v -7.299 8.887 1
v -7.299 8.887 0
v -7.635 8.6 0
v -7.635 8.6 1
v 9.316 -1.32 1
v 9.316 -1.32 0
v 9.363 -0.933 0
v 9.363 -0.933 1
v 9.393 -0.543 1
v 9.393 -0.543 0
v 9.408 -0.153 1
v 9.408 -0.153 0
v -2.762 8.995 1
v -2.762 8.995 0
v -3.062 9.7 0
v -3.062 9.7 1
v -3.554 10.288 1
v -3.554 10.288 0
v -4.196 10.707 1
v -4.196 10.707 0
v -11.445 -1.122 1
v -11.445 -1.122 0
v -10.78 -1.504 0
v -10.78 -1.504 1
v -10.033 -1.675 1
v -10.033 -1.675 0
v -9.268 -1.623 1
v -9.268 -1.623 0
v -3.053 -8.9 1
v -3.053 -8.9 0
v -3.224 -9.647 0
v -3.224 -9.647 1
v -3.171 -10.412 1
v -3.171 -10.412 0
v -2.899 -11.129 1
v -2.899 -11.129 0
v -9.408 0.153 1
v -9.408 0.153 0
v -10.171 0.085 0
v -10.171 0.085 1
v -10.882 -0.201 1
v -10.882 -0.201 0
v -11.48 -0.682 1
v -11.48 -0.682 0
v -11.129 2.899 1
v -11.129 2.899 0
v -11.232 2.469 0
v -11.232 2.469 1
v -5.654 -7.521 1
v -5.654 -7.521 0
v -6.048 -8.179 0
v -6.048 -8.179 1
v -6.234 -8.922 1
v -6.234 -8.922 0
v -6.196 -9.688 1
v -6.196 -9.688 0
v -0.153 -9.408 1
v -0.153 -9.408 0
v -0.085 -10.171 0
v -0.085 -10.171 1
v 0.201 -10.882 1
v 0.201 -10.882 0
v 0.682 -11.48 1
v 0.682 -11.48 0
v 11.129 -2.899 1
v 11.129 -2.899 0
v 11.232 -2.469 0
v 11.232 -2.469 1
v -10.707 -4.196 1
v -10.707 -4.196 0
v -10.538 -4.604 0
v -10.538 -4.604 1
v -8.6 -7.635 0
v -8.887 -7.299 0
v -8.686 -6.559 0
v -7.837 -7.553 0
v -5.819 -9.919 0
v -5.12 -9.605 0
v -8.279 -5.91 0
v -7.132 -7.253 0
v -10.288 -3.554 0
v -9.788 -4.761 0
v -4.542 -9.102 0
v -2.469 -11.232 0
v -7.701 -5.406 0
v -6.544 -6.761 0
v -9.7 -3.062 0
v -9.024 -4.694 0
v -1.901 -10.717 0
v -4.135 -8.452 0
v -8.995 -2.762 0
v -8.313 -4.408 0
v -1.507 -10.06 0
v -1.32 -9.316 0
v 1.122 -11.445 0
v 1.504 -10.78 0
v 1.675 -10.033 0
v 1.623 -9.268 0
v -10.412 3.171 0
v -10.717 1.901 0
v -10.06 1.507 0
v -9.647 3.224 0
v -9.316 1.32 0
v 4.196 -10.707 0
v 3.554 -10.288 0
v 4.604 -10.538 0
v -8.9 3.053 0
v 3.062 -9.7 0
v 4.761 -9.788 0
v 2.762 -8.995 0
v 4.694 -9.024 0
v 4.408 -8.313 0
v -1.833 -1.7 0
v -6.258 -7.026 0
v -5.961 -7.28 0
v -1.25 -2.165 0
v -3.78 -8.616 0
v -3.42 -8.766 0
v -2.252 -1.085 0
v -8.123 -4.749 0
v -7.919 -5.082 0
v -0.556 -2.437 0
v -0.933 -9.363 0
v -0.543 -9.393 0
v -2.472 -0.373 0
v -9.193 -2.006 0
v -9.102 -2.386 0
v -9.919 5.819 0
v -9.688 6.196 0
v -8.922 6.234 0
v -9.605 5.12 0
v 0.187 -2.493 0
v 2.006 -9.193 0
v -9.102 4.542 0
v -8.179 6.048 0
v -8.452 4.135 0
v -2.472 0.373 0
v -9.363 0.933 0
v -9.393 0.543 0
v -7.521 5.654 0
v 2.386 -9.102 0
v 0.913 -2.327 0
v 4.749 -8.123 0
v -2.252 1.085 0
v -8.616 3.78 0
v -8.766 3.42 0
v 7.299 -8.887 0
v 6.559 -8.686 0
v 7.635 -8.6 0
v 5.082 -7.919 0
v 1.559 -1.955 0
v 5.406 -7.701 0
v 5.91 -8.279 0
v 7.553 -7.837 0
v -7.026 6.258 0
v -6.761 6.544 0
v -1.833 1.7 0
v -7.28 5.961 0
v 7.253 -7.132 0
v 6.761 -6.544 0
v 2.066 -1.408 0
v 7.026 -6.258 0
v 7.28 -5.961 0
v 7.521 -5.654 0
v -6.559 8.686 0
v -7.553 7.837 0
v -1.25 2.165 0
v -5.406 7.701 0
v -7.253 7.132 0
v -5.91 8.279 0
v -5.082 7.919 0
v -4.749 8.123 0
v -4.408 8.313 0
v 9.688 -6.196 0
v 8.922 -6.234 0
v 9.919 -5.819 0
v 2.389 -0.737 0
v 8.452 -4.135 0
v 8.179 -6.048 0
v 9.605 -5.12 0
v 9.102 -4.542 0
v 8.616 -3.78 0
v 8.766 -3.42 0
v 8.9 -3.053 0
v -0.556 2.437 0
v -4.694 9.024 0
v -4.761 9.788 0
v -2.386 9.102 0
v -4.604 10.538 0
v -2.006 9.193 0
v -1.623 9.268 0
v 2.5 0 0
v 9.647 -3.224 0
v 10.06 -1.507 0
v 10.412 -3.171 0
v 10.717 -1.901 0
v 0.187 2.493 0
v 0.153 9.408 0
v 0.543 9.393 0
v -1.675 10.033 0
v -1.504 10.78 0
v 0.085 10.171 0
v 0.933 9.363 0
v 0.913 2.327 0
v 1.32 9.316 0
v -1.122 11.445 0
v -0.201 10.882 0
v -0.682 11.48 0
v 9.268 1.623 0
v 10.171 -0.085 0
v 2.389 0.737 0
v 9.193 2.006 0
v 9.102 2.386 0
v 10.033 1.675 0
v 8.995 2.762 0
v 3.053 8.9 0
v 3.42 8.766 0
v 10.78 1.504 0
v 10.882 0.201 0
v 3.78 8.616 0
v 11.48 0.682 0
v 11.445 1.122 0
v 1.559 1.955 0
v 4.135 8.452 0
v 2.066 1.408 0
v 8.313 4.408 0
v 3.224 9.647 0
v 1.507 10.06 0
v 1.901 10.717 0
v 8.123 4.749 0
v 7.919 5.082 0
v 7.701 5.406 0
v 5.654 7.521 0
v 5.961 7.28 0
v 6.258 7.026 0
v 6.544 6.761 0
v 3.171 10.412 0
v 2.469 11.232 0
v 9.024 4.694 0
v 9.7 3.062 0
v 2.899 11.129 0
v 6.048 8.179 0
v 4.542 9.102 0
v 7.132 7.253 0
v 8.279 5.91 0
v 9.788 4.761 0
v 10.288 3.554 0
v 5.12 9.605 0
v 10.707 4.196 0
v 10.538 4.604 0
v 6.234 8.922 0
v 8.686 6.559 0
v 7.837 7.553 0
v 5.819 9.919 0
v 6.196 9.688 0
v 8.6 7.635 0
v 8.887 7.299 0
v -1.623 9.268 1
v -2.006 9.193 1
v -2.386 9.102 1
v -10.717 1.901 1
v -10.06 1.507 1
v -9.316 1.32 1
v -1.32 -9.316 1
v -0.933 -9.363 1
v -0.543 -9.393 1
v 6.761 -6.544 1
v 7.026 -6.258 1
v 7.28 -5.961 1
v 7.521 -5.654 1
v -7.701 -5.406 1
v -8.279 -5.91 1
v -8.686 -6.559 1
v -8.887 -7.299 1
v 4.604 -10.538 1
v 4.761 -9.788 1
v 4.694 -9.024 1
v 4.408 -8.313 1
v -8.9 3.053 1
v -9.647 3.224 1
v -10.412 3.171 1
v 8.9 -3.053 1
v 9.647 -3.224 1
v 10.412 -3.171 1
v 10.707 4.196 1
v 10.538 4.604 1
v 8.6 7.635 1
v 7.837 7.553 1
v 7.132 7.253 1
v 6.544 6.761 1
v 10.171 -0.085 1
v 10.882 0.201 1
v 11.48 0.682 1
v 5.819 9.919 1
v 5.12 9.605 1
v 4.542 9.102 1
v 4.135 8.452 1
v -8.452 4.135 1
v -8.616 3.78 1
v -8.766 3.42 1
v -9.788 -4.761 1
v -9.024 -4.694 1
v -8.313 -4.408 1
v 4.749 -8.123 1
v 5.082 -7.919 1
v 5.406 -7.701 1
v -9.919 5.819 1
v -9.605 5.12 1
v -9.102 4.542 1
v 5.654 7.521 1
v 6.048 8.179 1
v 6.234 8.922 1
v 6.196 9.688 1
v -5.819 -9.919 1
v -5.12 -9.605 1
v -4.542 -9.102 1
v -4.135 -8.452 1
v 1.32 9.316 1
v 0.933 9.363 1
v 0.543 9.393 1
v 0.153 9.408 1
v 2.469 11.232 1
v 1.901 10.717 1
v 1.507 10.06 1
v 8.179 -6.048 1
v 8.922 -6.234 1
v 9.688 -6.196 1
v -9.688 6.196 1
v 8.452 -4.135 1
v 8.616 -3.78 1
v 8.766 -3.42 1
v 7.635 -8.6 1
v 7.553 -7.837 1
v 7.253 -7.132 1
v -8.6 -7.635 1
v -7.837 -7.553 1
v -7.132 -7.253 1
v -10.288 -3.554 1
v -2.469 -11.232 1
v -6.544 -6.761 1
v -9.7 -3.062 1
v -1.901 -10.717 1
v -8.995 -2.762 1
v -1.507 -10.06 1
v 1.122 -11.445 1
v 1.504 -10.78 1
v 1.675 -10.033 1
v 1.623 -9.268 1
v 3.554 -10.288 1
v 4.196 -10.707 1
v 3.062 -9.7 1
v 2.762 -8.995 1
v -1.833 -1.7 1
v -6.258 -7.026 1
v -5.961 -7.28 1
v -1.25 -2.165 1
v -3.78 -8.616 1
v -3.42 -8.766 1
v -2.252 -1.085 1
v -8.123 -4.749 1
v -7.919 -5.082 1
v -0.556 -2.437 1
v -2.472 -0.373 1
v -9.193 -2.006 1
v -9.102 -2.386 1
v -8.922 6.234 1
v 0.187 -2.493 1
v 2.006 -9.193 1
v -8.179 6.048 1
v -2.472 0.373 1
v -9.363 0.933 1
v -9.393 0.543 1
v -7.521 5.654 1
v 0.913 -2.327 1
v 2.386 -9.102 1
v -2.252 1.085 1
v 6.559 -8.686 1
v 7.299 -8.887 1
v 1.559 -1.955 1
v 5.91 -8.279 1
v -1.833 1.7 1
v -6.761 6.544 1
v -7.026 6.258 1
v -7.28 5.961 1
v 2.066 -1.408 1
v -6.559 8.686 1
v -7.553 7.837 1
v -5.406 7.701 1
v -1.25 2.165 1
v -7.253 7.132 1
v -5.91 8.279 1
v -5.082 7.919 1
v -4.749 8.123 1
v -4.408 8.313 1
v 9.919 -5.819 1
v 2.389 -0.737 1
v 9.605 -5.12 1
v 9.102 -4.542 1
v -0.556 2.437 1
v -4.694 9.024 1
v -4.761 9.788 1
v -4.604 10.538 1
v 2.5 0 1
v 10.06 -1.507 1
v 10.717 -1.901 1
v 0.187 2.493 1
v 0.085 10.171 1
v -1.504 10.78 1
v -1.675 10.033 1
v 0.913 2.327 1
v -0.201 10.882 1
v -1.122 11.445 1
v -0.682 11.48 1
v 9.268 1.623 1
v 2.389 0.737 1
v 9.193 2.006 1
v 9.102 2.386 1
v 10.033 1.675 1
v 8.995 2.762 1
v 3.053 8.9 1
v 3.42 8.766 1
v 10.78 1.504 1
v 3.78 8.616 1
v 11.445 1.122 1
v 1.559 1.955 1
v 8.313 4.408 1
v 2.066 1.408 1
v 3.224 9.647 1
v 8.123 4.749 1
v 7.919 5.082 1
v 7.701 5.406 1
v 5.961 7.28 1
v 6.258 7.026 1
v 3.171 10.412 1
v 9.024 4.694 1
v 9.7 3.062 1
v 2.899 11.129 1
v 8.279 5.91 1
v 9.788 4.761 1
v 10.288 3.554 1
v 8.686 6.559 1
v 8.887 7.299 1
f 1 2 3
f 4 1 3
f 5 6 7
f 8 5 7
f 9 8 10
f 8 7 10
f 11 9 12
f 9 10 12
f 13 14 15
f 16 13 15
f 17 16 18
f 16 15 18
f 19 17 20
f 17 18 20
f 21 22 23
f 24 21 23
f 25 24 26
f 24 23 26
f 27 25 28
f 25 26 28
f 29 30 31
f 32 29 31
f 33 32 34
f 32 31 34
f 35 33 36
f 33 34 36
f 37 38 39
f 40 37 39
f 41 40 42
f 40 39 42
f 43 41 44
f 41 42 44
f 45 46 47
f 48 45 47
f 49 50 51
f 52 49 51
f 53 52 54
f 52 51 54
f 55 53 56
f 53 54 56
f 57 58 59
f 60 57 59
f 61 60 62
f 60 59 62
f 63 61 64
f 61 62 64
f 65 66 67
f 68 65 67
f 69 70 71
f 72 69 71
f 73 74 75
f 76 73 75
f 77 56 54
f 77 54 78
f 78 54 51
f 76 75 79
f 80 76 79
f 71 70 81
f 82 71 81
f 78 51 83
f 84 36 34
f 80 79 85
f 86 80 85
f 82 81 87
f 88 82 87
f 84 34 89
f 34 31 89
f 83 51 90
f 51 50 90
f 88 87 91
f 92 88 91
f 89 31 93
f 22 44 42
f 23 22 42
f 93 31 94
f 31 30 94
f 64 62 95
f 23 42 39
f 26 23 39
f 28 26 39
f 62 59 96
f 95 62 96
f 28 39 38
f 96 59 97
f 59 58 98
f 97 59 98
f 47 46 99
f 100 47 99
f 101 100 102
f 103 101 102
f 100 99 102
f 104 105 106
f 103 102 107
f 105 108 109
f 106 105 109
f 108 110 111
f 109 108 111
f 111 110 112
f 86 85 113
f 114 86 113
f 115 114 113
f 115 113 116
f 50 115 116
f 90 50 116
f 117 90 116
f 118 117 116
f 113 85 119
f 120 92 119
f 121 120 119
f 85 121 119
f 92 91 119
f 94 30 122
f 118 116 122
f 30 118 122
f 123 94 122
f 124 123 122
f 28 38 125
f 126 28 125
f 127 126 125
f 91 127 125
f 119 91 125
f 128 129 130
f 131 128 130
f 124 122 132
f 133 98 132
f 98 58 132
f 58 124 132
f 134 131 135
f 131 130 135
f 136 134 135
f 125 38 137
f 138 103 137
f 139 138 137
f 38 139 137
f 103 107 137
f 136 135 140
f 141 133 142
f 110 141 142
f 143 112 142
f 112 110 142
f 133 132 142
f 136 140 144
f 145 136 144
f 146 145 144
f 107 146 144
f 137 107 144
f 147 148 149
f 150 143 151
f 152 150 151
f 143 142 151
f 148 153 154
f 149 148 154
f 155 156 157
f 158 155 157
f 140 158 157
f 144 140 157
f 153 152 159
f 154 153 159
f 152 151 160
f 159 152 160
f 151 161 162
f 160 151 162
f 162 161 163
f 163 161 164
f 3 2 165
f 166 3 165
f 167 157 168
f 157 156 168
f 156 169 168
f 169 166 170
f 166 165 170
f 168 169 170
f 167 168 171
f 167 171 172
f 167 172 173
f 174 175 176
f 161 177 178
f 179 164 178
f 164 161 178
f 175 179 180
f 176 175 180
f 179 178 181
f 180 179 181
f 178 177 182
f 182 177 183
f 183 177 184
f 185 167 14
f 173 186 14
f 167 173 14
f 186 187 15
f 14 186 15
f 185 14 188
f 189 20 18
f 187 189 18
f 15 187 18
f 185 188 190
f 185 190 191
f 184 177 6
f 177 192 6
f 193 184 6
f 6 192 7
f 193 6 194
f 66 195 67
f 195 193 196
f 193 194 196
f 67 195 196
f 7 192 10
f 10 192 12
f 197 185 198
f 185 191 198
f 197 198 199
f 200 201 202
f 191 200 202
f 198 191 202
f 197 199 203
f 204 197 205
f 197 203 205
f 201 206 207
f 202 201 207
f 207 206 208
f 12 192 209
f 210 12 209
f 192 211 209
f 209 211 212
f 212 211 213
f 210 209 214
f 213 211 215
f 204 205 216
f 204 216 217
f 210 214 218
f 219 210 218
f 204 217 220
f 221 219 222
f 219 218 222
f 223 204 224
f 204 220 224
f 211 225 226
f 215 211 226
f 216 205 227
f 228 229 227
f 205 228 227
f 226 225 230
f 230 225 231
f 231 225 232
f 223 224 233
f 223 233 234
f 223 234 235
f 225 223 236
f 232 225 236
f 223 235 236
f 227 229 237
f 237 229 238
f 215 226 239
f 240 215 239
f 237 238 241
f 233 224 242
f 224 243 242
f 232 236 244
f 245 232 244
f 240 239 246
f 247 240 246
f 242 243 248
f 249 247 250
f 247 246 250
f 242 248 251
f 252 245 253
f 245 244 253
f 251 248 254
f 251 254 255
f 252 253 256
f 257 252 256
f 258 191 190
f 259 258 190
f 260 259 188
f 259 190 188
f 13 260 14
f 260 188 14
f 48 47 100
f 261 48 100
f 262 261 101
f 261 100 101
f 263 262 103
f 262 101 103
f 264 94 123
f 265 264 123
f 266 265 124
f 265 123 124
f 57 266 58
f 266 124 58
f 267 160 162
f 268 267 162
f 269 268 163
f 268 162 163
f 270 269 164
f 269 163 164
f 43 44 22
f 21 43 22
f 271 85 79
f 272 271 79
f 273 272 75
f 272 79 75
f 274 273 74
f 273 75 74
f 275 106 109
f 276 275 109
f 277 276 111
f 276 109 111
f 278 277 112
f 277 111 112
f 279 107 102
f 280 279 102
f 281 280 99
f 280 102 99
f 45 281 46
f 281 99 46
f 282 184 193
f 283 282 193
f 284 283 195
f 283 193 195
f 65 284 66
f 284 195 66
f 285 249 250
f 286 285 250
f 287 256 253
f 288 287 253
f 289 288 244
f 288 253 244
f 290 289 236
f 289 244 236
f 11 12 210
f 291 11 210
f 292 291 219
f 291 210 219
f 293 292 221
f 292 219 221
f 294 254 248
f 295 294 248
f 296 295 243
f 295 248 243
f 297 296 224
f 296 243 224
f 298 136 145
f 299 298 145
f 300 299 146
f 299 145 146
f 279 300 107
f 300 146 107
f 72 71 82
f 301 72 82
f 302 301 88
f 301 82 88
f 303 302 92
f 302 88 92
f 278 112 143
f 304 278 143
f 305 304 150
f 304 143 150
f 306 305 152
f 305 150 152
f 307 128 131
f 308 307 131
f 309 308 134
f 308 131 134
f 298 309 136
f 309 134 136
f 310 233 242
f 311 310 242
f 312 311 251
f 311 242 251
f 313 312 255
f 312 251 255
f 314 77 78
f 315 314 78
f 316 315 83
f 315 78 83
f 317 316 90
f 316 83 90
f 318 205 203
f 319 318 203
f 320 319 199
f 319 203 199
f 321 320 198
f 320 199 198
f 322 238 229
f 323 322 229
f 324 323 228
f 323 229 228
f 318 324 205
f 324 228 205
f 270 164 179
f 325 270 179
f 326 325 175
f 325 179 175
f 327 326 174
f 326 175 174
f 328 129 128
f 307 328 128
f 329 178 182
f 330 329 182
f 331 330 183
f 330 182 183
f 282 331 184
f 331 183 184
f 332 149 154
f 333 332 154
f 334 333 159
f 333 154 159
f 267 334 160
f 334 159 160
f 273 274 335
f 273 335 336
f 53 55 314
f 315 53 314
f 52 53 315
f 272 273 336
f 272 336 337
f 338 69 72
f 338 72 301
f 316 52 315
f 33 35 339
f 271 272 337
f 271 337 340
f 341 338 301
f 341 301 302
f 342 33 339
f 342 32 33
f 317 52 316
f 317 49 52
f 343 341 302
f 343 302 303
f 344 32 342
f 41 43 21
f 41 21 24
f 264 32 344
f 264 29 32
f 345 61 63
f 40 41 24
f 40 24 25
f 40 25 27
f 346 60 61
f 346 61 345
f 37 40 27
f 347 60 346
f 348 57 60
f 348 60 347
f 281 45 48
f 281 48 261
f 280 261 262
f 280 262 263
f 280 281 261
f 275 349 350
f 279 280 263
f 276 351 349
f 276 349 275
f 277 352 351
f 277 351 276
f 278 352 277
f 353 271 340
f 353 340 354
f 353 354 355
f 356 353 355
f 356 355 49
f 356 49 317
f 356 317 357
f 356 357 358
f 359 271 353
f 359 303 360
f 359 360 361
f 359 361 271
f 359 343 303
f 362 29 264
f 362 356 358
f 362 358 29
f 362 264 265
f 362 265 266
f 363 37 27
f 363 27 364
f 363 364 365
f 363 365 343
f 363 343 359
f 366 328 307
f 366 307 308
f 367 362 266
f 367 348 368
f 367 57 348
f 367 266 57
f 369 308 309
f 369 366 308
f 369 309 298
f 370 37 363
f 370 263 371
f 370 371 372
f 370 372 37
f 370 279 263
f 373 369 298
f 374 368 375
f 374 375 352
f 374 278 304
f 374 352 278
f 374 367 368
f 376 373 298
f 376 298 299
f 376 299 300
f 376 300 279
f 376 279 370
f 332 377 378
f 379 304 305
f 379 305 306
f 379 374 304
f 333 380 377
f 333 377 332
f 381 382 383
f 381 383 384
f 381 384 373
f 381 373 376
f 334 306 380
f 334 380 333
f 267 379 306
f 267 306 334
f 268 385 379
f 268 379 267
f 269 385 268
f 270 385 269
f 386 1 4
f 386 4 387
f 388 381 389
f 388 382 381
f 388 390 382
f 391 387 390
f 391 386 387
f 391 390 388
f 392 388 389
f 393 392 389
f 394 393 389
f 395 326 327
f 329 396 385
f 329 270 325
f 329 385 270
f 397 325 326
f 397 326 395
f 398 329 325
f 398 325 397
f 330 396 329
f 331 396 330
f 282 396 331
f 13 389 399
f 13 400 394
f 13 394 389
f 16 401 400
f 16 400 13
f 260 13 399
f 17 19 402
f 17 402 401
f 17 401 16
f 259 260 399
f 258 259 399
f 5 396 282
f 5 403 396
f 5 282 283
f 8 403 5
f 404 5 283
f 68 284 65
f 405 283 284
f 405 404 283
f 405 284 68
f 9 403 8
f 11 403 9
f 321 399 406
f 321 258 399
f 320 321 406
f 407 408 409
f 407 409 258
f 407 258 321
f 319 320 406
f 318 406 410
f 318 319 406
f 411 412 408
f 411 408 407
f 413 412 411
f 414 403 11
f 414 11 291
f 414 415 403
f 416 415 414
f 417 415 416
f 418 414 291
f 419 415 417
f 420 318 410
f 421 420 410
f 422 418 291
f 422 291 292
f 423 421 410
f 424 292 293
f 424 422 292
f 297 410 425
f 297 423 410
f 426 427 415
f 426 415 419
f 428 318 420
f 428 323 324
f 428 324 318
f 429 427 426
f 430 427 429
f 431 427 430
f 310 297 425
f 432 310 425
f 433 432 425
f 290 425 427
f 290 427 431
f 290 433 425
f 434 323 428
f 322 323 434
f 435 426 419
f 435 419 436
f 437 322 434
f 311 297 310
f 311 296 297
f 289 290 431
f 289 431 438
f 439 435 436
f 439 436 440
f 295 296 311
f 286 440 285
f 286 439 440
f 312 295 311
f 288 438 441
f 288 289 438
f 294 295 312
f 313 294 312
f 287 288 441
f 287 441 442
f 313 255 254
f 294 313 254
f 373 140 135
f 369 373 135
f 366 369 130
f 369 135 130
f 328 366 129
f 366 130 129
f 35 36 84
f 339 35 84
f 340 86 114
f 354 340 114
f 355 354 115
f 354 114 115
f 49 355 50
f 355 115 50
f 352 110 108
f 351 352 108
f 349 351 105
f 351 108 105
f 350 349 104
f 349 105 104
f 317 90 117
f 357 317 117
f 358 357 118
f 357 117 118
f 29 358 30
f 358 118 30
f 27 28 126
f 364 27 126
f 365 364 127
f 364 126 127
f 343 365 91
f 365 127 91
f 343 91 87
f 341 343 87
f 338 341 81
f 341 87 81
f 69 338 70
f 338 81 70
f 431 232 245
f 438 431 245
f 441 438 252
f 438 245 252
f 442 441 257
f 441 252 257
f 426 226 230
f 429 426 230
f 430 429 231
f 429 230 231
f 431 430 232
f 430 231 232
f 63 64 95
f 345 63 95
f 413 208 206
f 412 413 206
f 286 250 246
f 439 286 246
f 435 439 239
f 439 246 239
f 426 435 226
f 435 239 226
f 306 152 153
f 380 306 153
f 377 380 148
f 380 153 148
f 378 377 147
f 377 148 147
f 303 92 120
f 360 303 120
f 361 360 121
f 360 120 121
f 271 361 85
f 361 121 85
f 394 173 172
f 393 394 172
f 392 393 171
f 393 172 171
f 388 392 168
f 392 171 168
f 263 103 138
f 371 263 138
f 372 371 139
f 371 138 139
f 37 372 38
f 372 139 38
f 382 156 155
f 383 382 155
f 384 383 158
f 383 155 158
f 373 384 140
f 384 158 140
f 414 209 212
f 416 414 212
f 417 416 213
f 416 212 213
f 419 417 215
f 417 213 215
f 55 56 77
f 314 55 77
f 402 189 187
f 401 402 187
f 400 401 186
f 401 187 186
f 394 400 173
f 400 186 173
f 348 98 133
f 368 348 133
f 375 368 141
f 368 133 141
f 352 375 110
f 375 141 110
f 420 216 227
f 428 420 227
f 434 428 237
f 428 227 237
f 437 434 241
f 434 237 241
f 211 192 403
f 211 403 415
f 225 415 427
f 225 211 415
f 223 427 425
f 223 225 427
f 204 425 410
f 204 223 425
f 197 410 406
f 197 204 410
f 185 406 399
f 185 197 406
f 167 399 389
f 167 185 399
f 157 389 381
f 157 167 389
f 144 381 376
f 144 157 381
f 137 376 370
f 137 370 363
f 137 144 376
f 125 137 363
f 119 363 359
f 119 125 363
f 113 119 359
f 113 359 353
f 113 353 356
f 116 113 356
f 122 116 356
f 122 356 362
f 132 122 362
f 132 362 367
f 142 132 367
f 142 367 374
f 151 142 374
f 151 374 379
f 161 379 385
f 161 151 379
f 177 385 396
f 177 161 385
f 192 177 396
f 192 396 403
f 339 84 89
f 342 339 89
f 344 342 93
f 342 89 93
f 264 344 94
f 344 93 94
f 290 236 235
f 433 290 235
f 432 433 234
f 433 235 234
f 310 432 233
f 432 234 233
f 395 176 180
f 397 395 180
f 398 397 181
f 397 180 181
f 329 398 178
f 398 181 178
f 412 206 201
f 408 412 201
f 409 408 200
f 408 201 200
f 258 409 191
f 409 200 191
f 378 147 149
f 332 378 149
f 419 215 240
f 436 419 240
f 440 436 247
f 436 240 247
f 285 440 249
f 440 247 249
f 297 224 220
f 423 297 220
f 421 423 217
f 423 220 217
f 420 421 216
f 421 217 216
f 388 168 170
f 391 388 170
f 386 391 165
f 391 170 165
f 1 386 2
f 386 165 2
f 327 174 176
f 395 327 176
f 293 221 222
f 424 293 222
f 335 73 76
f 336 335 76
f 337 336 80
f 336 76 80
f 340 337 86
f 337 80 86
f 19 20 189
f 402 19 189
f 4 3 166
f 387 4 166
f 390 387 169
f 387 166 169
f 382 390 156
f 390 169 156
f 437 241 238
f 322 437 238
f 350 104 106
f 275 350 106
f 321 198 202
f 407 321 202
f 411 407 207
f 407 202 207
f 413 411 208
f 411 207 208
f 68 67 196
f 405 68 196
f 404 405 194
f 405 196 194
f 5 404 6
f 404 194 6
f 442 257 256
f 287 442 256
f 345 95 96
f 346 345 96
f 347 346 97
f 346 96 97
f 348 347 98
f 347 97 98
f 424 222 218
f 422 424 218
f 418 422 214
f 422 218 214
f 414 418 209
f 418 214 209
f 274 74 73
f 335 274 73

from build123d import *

# Parameters (mm, degrees)
F1_R     = 2.5
F2_DEPTH = 1


with BuildPart() as f2:
    # F1 (on Top) → F2 (new body)
    with BuildSketch(Plane.XY):
        with BuildLine():
            ThreePointArc((-1.6229776334, 9.2680599554), (-0.7382287643, 9.3800858219), (0.1531520845, 9.4078443957))
            ThreePointArc((0.1531520845, 9.4078443957), (-0.0317997207, 10.5374998224), (-0.6817601701, 11.4797736507))
            Line((-0.6817601701, 11.4797736507), (-1.1224656787, 11.4450893749))
            ThreePointArc((-1.1224656787, 11.4450893749), (-1.6170199342, 10.4127402859), (-1.6229776334, 9.2680599554))
        make_face()
        with BuildLine():
            ThreePointArc((9.4078443957, -0.1531520845), (9.4087792756, -0.0765785786), (9.4090909091, 0))
            ThreePointArc((9.4090909091, 0), (9.3737668631, 0.8145468262), (9.2680599554, 1.6229776334))
            ThreePointArc((9.2680599554, 1.6229776334), (9.1491169783, 2.1965086508), (8.9947183137, 2.7615275108))
            ThreePointArc((8.9947183137, 2.7615275108), (8.6928665104, 3.6007032045), (8.3129211438, 4.4075314852))
            ThreePointArc((8.3129211438, 4.4075314852), (8.0225688191, 4.9162364953), (7.7011265332, 5.4058895526))
            ThreePointArc((7.7011265332, 5.4058895526), (7.1547288581, 6.1107157275), (6.5440556911, 6.7606454461))
            ThreePointArc((6.5440556911, 6.7606454461), (6.1107157275, 7.1547288581), (5.6536948308, 7.52108546))
            ThreePointArc((5.6536948308, 7.52108546), (4.9162364953, 8.0225688191), (4.1346124722, 8.4519803265))
            ThreePointArc((4.1346124722, 8.4519803265), (3.6007032045, 8.6928665104), (3.0528400867, 8.90006512))
            ThreePointArc((3.0528400867, 8.90006512), (2.1965086508, 9.1491169783), (1.320444577, 9.3159764842))
            ThreePointArc((1.320444577, 9.3159764842), (0.7382287643, 9.3800858219), (0.1531520845, 9.4078443957))
            ThreePointArc((0.1531520845, 9.4078443957), (-0.7382287643, 9.3800858219), (-1.6229776334, 9.2680599554))
            ThreePointArc((-1.6229776334, 9.2680599554), (-2.1965086508, 9.1491169783), (-2.7615275108, 8.9947183137))
            ThreePointArc((-2.7615275108, 8.9947183137), (-3.6007032045, 8.6928665104), (-4.4075314852, 8.3129211438))
            ThreePointArc((-4.4075314852, 8.3129211438), (-4.9162364953, 8.0225688191), (-5.4058895526, 7.7011265332))
            ThreePointArc((-5.4058895526, 7.7011265332), (-6.1107157275, 7.1547288581), (-6.7606454461, 6.5440556911))
            ThreePointArc((-6.7606454461, 6.5440556911), (-7.1547288581, 6.1107157275), (-7.52108546, 5.6536948308))
            ThreePointArc((-7.52108546, 5.6536948308), (-8.0225688191, 4.9162364953), (-8.4519803265, 4.1346124722))
            ThreePointArc((-8.4519803265, 4.1346124722), (-8.6928665104, 3.6007032045), (-8.90006512, 3.0528400867))
            ThreePointArc((-8.90006512, 3.0528400867), (-9.1491169783, 2.1965086508), (-9.3159764842, 1.320444577))
            ThreePointArc((-9.3159764842, 1.320444577), (-9.3800858219, 0.7382287643), (-9.4078443957, 0.1531520845))
            ThreePointArc((-9.4078443957, 0.1531520845), (-9.3800858219, -0.7382287643), (-9.2680599554, -1.6229776334))
            ThreePointArc((-9.2680599554, -1.6229776334), (-9.1491169783, -2.1965086508), (-8.9947183137, -2.7615275108))
            ThreePointArc((-8.9947183137, -2.7615275108), (-8.6928665104, -3.6007032045), (-8.3129211438, -4.4075314852))
            ThreePointArc((-8.3129211438, -4.4075314852), (-8.0225688191, -4.9162364953), (-7.7011265332, -5.4058895526))
            ThreePointArc((-7.7011265332, -5.4058895526), (-7.1547288581, -6.1107157275), (-6.5440556911, -6.7606454461))
            ThreePointArc((-6.5440556911, -6.7606454461), (-6.1107157275, -7.1547288581), (-5.6536948308, -7.52108546))
            ThreePointArc((-5.6536948308, -7.52108546), (-4.9162364953, -8.0225688191), (-4.1346124722, -8.4519803265))
            ThreePointArc((-4.1346124722, -8.4519803265), (-3.6007032045, -8.6928665104), (-3.0528400867, -8.90006512))
            ThreePointArc((-3.0528400867, -8.90006512), (-2.1965086508, -9.1491169783), (-1.320444577, -9.3159764842))
            ThreePointArc((-1.320444577, -9.3159764842), (-0.7382287643, -9.3800858219), (-0.1531520845, -9.4078443957))
            ThreePointArc((-0.1531520845, -9.4078443957), (0.7382287643, -9.3800858219), (1.6229776334, -9.2680599554))
            ThreePointArc((1.6229776334, -9.2680599554), (2.1965086508, -9.1491169783), (2.7615275108, -8.9947183137))
            ThreePointArc((2.7615275108, -8.9947183137), (3.6007032045, -8.6928665104), (4.4075314852, -8.3129211438))
            ThreePointArc((4.4075314852, -8.3129211438), (4.9162364953, -8.0225688191), (5.4058895526, -7.7011265332))
            ThreePointArc((5.4058895526, -7.7011265332), (6.1107157275, -7.1547288581), (6.7606454461, -6.5440556911))
            ThreePointArc((6.7606454461, -6.5440556911), (7.1547288581, -6.1107157275), (7.52108546, -5.6536948308))
            ThreePointArc((7.52108546, -5.6536948308), (8.0225688191, -4.9162364953), (8.4519803265, -4.1346124722))
            ThreePointArc((8.4519803265, -4.1346124722), (8.6928665104, -3.6007032045), (8.90006512, -3.0528400867))
            ThreePointArc((8.90006512, -3.0528400867), (9.1491169783, -2.1965086508), (9.3159764842, -1.320444577))
            ThreePointArc((9.3159764842, -1.320444577), (9.3800858219, -0.7382287643), (9.4078443957, -0.1531520845))
        make_face()
        Circle(F1_R, mode=Mode.SUBTRACT)
        with BuildLine():
            ThreePointArc((-4.4075314852, 8.3129211438), (-3.6007032045, 8.6928665104), (-2.7615275108, 8.9947183137))
            ThreePointArc((-2.7615275108, 8.9947183137), (-3.286509855, 10.0119312174), (-4.195837602, 10.7072380574))
            Line((-4.195837602, 10.7072380574), (-4.604255417, 10.5380658593))
            ThreePointArc((-4.604255417, 10.5380658593), (-4.7555910517, 9.4034178615), (-4.4075314852, 8.3129211438))
        make_face()
        with BuildLine():
            ThreePointArc((-6.7606454461, 6.5440556911), (-6.1107157275, 7.1547288581), (-5.4058895526, 7.7011265332))
            ThreePointArc((-5.4058895526, 7.7011265332), (-6.2195135061, 8.5063250277), (-7.2991972152, 8.8866034014))
            Line((-7.2991972152, 8.8866034014), (-7.6353485554, 8.5995030343))
            ThreePointArc((-7.6353485554, 8.5995030343), (-7.428651783, 7.4736233793), (-6.7606454461, 6.5440556911))
        make_face()
        with BuildLine():
            ThreePointArc((-8.4519803265, 4.1346124722), (-8.0225688191, 4.9162364953), (-7.52108546, 5.6536948308))
            ThreePointArc((-7.52108546, 5.6536948308), (-8.5437078414, 6.1680604771), (-9.6880605486, 6.1960860878))
            Line((-9.6880605486, 6.1960860878), (-9.9190405786, 5.8191609361))
            ThreePointArc((-9.9190405786, 5.8191609361), (-9.3745443193, 4.812258569), (-8.4519803265, 4.1346124722))
        make_face()
        with BuildLine():
            ThreePointArc((-9.3159764842, 1.320444577), (-9.1491169783, 2.1965086508), (-8.90006512, 3.0528400867))
            ThreePointArc((-8.90006512, 3.0528400867), (-10.0315845257, 3.2260231917), (-11.1285890147, 2.8990526973))
            Line((-11.1285890147, 2.8990526973), (-11.2317877999, 2.469198821))
            ThreePointArc((-11.2317877999, 2.469198821), (-10.4027911413, 1.679836361), (-9.3159764842, 1.320444577))
        make_face()
        with BuildLine():
            ThreePointArc((-9.2680599554, -1.6229776334), (-9.3800858219, -0.7382287643), (-9.4078443957, 0.1531520845))
            ThreePointArc((-9.4078443957, 0.1531520845), (-10.5374998224, -0.0317997207), (-11.4797736507, -0.6817601701))
            Line((-11.4797736507, -0.6817601701), (-11.4450893749, -1.1224656787))
            ThreePointArc((-11.4450893749, -1.1224656787), (-10.4127402859, -1.6170199342), (-9.2680599554, -1.6229776334))
        make_face()
        with BuildLine():
            ThreePointArc((-10.5380658593, -4.604255417), (-9.4034178615, -4.7555910517), (-8.3129211438, -4.4075314852))
            ThreePointArc((-8.3129211438, -4.4075314852), (-8.6928665104, -3.6007032045), (-8.9947183137, -2.7615275108))
            ThreePointArc((-8.9947183137, -2.7615275108), (-10.0119312174, -3.286509855), (-10.7072380574, -4.195837602))
            Line((-10.7072380574, -4.195837602), (-10.5380658593, -4.604255417))
        make_face()
        with BuildLine():
            ThreePointArc((-8.5995030343, -7.6353485554), (-7.4736233793, -7.428651783), (-6.5440556911, -6.7606454461))
            ThreePointArc((-6.5440556911, -6.7606454461), (-7.1547288581, -6.1107157275), (-7.7011265332, -5.4058895526))
            ThreePointArc((-7.7011265332, -5.4058895526), (-8.5063250277, -6.2195135061), (-8.8866034014, -7.2991972152))
            Line((-8.8866034014, -7.2991972152), (-8.5995030343, -7.6353485554))
        make_face()
        with BuildLine():
            ThreePointArc((-5.8191609361, -9.9190405786), (-4.812258569, -9.3745443193), (-4.1346124722, -8.4519803265))
            ThreePointArc((-4.1346124722, -8.4519803265), (-4.9162364953, -8.0225688191), (-5.6536948308, -7.52108546))
            ThreePointArc((-5.6536948308, -7.52108546), (-6.1680604771, -8.5437078414), (-6.1960860878, -9.6880605486))
            Line((-6.1960860878, -9.6880605486), (-5.8191609361, -9.9190405786))
        make_face()
        with BuildLine():
            ThreePointArc((-2.469198821, -11.2317877999), (-1.679836361, -10.4027911413), (-1.320444577, -9.3159764842))
            ThreePointArc((-1.320444577, -9.3159764842), (-2.1965086508, -9.1491169783), (-3.0528400867, -8.90006512))
            ThreePointArc((-3.0528400867, -8.90006512), (-3.2260231917, -10.0315845257), (-2.8990526973, -11.1285890147))
            Line((-2.8990526973, -11.1285890147), (-2.469198821, -11.2317877999))
        make_face()
        with BuildLine():
            ThreePointArc((1.1224656787, -11.4450893749), (1.6170199342, -10.4127402859), (1.6229776334, -9.2680599554))
            ThreePointArc((1.6229776334, -9.2680599554), (0.7382287643, -9.3800858219), (-0.1531520845, -9.4078443957))
            ThreePointArc((-0.1531520845, -9.4078443957), (0.0317997207, -10.5374998224), (0.6817601701, -11.4797736507))
            Line((0.6817601701, -11.4797736507), (1.1224656787, -11.4450893749))
        make_face()
        with BuildLine():
            ThreePointArc((4.604255417, -10.5380658593), (4.7555910517, -9.4034178615), (4.4075314852, -8.3129211438))
            ThreePointArc((4.4075314852, -8.3129211438), (3.6007032045, -8.6928665104), (2.7615275108, -8.9947183137))
            ThreePointArc((2.7615275108, -8.9947183137), (3.286509855, -10.0119312174), (4.195837602, -10.7072380574))
            Line((4.195837602, -10.7072380574), (4.604255417, -10.5380658593))
        make_face()
        with BuildLine():
            ThreePointArc((7.6353485554, -8.5995030343), (7.428651783, -7.4736233793), (6.7606454461, -6.5440556911))
            ThreePointArc((6.7606454461, -6.5440556911), (6.1107157275, -7.1547288581), (5.4058895526, -7.7011265332))
            ThreePointArc((5.4058895526, -7.7011265332), (6.2195135061, -8.5063250277), (7.2991972152, -8.8866034014))
            Line((7.2991972152, -8.8866034014), (7.6353485554, -8.5995030343))
        make_face()
        with BuildLine():
            ThreePointArc((9.9190405786, -5.8191609361), (9.3745443193, -4.812258569), (8.4519803265, -4.1346124722))
            ThreePointArc((8.4519803265, -4.1346124722), (8.0225688191, -4.9162364953), (7.52108546, -5.6536948308))
            ThreePointArc((7.52108546, -5.6536948308), (8.5437078414, -6.1680604771), (9.6880605486, -6.1960860878))
            Line((9.6880605486, -6.1960860878), (9.9190405786, -5.8191609361))
        make_face()
        with BuildLine():
            ThreePointArc((11.2317877999, -2.469198821), (10.4027911413, -1.679836361), (9.3159764842, -1.320444577))
            ThreePointArc((9.3159764842, -1.320444577), (9.1491169783, -2.1965086508), (8.90006512, -3.0528400867))
            ThreePointArc((8.90006512, -3.0528400867), (10.0315845257, -3.2260231917), (11.1285890147, -2.8990526973))
            Line((11.1285890147, -2.8990526973), (11.2317877999, -2.469198821))
        make_face()
        with BuildLine():
            ThreePointArc((9.2680599554, 1.6229776334), (9.3737668631, 0.8145468262), (9.4090909091, 0))
            ThreePointArc((9.4090909091, 0), (9.4087792756, -0.0765785786), (9.4078443957, -0.1531520845))
            ThreePointArc((9.4078443957, -0.1531520845), (10.5374998224, 0.0317997207), (11.4797736507, 0.6817601701))
            Line((11.4797736507, 0.6817601701), (11.4450893749, 1.1224656787))
            ThreePointArc((11.4450893749, 1.1224656787), (10.4127402859, 1.6170199342), (9.2680599554, 1.6229776334))
        make_face()
        with BuildLine():
            ThreePointArc((8.3129211438, 4.4075314852), (8.6928665104, 3.6007032045), (8.9947183137, 2.7615275108))
            ThreePointArc((8.9947183137, 2.7615275108), (10.0119312174, 3.286509855), (10.7072380574, 4.195837602))
            Line((10.7072380574, 4.195837602), (10.5380658593, 4.604255417))
            ThreePointArc((10.5380658593, 4.604255417), (9.4034178615, 4.7555910517), (8.3129211438, 4.4075314852))
        make_face()
        with BuildLine():
            ThreePointArc((6.5440556911, 6.7606454461), (7.1547288581, 6.1107157275), (7.7011265332, 5.4058895526))
            ThreePointArc((7.7011265332, 5.4058895526), (8.5063250277, 6.2195135061), (8.8866034014, 7.2991972152))
            Line((8.8866034014, 7.2991972152), (8.5995030343, 7.6353485554))
            ThreePointArc((8.5995030343, 7.6353485554), (7.4736233793, 7.428651783), (6.5440556911, 6.7606454461))
        make_face()
        with BuildLine():
            ThreePointArc((4.1346124722, 8.4519803265), (4.9162364953, 8.0225688191), (5.6536948308, 7.52108546))
            ThreePointArc((5.6536948308, 7.52108546), (6.1680604771, 8.5437078414), (6.1960860878, 9.6880605486))
            Line((6.1960860878, 9.6880605486), (5.8191609361, 9.9190405786))
            ThreePointArc((5.8191609361, 9.9190405786), (4.812258569, 9.3745443193), (4.1346124722, 8.4519803265))
        make_face()
        with BuildLine():
            ThreePointArc((1.320444577, 9.3159764842), (2.1965086508, 9.1491169783), (3.0528400867, 8.90006512))
            ThreePointArc((3.0528400867, 8.90006512), (3.2260231917, 10.0315845257), (2.8990526973, 11.1285890147))
            Line((2.8990526973, 11.1285890147), (2.469198821, 11.2317877999))
            ThreePointArc((2.469198821, 11.2317877999), (1.679836361, 10.4027911413), (1.320444577, 9.3159764842))
        make_face()
    extrude(amount=F2_DEPTH)


solid = f2.part
